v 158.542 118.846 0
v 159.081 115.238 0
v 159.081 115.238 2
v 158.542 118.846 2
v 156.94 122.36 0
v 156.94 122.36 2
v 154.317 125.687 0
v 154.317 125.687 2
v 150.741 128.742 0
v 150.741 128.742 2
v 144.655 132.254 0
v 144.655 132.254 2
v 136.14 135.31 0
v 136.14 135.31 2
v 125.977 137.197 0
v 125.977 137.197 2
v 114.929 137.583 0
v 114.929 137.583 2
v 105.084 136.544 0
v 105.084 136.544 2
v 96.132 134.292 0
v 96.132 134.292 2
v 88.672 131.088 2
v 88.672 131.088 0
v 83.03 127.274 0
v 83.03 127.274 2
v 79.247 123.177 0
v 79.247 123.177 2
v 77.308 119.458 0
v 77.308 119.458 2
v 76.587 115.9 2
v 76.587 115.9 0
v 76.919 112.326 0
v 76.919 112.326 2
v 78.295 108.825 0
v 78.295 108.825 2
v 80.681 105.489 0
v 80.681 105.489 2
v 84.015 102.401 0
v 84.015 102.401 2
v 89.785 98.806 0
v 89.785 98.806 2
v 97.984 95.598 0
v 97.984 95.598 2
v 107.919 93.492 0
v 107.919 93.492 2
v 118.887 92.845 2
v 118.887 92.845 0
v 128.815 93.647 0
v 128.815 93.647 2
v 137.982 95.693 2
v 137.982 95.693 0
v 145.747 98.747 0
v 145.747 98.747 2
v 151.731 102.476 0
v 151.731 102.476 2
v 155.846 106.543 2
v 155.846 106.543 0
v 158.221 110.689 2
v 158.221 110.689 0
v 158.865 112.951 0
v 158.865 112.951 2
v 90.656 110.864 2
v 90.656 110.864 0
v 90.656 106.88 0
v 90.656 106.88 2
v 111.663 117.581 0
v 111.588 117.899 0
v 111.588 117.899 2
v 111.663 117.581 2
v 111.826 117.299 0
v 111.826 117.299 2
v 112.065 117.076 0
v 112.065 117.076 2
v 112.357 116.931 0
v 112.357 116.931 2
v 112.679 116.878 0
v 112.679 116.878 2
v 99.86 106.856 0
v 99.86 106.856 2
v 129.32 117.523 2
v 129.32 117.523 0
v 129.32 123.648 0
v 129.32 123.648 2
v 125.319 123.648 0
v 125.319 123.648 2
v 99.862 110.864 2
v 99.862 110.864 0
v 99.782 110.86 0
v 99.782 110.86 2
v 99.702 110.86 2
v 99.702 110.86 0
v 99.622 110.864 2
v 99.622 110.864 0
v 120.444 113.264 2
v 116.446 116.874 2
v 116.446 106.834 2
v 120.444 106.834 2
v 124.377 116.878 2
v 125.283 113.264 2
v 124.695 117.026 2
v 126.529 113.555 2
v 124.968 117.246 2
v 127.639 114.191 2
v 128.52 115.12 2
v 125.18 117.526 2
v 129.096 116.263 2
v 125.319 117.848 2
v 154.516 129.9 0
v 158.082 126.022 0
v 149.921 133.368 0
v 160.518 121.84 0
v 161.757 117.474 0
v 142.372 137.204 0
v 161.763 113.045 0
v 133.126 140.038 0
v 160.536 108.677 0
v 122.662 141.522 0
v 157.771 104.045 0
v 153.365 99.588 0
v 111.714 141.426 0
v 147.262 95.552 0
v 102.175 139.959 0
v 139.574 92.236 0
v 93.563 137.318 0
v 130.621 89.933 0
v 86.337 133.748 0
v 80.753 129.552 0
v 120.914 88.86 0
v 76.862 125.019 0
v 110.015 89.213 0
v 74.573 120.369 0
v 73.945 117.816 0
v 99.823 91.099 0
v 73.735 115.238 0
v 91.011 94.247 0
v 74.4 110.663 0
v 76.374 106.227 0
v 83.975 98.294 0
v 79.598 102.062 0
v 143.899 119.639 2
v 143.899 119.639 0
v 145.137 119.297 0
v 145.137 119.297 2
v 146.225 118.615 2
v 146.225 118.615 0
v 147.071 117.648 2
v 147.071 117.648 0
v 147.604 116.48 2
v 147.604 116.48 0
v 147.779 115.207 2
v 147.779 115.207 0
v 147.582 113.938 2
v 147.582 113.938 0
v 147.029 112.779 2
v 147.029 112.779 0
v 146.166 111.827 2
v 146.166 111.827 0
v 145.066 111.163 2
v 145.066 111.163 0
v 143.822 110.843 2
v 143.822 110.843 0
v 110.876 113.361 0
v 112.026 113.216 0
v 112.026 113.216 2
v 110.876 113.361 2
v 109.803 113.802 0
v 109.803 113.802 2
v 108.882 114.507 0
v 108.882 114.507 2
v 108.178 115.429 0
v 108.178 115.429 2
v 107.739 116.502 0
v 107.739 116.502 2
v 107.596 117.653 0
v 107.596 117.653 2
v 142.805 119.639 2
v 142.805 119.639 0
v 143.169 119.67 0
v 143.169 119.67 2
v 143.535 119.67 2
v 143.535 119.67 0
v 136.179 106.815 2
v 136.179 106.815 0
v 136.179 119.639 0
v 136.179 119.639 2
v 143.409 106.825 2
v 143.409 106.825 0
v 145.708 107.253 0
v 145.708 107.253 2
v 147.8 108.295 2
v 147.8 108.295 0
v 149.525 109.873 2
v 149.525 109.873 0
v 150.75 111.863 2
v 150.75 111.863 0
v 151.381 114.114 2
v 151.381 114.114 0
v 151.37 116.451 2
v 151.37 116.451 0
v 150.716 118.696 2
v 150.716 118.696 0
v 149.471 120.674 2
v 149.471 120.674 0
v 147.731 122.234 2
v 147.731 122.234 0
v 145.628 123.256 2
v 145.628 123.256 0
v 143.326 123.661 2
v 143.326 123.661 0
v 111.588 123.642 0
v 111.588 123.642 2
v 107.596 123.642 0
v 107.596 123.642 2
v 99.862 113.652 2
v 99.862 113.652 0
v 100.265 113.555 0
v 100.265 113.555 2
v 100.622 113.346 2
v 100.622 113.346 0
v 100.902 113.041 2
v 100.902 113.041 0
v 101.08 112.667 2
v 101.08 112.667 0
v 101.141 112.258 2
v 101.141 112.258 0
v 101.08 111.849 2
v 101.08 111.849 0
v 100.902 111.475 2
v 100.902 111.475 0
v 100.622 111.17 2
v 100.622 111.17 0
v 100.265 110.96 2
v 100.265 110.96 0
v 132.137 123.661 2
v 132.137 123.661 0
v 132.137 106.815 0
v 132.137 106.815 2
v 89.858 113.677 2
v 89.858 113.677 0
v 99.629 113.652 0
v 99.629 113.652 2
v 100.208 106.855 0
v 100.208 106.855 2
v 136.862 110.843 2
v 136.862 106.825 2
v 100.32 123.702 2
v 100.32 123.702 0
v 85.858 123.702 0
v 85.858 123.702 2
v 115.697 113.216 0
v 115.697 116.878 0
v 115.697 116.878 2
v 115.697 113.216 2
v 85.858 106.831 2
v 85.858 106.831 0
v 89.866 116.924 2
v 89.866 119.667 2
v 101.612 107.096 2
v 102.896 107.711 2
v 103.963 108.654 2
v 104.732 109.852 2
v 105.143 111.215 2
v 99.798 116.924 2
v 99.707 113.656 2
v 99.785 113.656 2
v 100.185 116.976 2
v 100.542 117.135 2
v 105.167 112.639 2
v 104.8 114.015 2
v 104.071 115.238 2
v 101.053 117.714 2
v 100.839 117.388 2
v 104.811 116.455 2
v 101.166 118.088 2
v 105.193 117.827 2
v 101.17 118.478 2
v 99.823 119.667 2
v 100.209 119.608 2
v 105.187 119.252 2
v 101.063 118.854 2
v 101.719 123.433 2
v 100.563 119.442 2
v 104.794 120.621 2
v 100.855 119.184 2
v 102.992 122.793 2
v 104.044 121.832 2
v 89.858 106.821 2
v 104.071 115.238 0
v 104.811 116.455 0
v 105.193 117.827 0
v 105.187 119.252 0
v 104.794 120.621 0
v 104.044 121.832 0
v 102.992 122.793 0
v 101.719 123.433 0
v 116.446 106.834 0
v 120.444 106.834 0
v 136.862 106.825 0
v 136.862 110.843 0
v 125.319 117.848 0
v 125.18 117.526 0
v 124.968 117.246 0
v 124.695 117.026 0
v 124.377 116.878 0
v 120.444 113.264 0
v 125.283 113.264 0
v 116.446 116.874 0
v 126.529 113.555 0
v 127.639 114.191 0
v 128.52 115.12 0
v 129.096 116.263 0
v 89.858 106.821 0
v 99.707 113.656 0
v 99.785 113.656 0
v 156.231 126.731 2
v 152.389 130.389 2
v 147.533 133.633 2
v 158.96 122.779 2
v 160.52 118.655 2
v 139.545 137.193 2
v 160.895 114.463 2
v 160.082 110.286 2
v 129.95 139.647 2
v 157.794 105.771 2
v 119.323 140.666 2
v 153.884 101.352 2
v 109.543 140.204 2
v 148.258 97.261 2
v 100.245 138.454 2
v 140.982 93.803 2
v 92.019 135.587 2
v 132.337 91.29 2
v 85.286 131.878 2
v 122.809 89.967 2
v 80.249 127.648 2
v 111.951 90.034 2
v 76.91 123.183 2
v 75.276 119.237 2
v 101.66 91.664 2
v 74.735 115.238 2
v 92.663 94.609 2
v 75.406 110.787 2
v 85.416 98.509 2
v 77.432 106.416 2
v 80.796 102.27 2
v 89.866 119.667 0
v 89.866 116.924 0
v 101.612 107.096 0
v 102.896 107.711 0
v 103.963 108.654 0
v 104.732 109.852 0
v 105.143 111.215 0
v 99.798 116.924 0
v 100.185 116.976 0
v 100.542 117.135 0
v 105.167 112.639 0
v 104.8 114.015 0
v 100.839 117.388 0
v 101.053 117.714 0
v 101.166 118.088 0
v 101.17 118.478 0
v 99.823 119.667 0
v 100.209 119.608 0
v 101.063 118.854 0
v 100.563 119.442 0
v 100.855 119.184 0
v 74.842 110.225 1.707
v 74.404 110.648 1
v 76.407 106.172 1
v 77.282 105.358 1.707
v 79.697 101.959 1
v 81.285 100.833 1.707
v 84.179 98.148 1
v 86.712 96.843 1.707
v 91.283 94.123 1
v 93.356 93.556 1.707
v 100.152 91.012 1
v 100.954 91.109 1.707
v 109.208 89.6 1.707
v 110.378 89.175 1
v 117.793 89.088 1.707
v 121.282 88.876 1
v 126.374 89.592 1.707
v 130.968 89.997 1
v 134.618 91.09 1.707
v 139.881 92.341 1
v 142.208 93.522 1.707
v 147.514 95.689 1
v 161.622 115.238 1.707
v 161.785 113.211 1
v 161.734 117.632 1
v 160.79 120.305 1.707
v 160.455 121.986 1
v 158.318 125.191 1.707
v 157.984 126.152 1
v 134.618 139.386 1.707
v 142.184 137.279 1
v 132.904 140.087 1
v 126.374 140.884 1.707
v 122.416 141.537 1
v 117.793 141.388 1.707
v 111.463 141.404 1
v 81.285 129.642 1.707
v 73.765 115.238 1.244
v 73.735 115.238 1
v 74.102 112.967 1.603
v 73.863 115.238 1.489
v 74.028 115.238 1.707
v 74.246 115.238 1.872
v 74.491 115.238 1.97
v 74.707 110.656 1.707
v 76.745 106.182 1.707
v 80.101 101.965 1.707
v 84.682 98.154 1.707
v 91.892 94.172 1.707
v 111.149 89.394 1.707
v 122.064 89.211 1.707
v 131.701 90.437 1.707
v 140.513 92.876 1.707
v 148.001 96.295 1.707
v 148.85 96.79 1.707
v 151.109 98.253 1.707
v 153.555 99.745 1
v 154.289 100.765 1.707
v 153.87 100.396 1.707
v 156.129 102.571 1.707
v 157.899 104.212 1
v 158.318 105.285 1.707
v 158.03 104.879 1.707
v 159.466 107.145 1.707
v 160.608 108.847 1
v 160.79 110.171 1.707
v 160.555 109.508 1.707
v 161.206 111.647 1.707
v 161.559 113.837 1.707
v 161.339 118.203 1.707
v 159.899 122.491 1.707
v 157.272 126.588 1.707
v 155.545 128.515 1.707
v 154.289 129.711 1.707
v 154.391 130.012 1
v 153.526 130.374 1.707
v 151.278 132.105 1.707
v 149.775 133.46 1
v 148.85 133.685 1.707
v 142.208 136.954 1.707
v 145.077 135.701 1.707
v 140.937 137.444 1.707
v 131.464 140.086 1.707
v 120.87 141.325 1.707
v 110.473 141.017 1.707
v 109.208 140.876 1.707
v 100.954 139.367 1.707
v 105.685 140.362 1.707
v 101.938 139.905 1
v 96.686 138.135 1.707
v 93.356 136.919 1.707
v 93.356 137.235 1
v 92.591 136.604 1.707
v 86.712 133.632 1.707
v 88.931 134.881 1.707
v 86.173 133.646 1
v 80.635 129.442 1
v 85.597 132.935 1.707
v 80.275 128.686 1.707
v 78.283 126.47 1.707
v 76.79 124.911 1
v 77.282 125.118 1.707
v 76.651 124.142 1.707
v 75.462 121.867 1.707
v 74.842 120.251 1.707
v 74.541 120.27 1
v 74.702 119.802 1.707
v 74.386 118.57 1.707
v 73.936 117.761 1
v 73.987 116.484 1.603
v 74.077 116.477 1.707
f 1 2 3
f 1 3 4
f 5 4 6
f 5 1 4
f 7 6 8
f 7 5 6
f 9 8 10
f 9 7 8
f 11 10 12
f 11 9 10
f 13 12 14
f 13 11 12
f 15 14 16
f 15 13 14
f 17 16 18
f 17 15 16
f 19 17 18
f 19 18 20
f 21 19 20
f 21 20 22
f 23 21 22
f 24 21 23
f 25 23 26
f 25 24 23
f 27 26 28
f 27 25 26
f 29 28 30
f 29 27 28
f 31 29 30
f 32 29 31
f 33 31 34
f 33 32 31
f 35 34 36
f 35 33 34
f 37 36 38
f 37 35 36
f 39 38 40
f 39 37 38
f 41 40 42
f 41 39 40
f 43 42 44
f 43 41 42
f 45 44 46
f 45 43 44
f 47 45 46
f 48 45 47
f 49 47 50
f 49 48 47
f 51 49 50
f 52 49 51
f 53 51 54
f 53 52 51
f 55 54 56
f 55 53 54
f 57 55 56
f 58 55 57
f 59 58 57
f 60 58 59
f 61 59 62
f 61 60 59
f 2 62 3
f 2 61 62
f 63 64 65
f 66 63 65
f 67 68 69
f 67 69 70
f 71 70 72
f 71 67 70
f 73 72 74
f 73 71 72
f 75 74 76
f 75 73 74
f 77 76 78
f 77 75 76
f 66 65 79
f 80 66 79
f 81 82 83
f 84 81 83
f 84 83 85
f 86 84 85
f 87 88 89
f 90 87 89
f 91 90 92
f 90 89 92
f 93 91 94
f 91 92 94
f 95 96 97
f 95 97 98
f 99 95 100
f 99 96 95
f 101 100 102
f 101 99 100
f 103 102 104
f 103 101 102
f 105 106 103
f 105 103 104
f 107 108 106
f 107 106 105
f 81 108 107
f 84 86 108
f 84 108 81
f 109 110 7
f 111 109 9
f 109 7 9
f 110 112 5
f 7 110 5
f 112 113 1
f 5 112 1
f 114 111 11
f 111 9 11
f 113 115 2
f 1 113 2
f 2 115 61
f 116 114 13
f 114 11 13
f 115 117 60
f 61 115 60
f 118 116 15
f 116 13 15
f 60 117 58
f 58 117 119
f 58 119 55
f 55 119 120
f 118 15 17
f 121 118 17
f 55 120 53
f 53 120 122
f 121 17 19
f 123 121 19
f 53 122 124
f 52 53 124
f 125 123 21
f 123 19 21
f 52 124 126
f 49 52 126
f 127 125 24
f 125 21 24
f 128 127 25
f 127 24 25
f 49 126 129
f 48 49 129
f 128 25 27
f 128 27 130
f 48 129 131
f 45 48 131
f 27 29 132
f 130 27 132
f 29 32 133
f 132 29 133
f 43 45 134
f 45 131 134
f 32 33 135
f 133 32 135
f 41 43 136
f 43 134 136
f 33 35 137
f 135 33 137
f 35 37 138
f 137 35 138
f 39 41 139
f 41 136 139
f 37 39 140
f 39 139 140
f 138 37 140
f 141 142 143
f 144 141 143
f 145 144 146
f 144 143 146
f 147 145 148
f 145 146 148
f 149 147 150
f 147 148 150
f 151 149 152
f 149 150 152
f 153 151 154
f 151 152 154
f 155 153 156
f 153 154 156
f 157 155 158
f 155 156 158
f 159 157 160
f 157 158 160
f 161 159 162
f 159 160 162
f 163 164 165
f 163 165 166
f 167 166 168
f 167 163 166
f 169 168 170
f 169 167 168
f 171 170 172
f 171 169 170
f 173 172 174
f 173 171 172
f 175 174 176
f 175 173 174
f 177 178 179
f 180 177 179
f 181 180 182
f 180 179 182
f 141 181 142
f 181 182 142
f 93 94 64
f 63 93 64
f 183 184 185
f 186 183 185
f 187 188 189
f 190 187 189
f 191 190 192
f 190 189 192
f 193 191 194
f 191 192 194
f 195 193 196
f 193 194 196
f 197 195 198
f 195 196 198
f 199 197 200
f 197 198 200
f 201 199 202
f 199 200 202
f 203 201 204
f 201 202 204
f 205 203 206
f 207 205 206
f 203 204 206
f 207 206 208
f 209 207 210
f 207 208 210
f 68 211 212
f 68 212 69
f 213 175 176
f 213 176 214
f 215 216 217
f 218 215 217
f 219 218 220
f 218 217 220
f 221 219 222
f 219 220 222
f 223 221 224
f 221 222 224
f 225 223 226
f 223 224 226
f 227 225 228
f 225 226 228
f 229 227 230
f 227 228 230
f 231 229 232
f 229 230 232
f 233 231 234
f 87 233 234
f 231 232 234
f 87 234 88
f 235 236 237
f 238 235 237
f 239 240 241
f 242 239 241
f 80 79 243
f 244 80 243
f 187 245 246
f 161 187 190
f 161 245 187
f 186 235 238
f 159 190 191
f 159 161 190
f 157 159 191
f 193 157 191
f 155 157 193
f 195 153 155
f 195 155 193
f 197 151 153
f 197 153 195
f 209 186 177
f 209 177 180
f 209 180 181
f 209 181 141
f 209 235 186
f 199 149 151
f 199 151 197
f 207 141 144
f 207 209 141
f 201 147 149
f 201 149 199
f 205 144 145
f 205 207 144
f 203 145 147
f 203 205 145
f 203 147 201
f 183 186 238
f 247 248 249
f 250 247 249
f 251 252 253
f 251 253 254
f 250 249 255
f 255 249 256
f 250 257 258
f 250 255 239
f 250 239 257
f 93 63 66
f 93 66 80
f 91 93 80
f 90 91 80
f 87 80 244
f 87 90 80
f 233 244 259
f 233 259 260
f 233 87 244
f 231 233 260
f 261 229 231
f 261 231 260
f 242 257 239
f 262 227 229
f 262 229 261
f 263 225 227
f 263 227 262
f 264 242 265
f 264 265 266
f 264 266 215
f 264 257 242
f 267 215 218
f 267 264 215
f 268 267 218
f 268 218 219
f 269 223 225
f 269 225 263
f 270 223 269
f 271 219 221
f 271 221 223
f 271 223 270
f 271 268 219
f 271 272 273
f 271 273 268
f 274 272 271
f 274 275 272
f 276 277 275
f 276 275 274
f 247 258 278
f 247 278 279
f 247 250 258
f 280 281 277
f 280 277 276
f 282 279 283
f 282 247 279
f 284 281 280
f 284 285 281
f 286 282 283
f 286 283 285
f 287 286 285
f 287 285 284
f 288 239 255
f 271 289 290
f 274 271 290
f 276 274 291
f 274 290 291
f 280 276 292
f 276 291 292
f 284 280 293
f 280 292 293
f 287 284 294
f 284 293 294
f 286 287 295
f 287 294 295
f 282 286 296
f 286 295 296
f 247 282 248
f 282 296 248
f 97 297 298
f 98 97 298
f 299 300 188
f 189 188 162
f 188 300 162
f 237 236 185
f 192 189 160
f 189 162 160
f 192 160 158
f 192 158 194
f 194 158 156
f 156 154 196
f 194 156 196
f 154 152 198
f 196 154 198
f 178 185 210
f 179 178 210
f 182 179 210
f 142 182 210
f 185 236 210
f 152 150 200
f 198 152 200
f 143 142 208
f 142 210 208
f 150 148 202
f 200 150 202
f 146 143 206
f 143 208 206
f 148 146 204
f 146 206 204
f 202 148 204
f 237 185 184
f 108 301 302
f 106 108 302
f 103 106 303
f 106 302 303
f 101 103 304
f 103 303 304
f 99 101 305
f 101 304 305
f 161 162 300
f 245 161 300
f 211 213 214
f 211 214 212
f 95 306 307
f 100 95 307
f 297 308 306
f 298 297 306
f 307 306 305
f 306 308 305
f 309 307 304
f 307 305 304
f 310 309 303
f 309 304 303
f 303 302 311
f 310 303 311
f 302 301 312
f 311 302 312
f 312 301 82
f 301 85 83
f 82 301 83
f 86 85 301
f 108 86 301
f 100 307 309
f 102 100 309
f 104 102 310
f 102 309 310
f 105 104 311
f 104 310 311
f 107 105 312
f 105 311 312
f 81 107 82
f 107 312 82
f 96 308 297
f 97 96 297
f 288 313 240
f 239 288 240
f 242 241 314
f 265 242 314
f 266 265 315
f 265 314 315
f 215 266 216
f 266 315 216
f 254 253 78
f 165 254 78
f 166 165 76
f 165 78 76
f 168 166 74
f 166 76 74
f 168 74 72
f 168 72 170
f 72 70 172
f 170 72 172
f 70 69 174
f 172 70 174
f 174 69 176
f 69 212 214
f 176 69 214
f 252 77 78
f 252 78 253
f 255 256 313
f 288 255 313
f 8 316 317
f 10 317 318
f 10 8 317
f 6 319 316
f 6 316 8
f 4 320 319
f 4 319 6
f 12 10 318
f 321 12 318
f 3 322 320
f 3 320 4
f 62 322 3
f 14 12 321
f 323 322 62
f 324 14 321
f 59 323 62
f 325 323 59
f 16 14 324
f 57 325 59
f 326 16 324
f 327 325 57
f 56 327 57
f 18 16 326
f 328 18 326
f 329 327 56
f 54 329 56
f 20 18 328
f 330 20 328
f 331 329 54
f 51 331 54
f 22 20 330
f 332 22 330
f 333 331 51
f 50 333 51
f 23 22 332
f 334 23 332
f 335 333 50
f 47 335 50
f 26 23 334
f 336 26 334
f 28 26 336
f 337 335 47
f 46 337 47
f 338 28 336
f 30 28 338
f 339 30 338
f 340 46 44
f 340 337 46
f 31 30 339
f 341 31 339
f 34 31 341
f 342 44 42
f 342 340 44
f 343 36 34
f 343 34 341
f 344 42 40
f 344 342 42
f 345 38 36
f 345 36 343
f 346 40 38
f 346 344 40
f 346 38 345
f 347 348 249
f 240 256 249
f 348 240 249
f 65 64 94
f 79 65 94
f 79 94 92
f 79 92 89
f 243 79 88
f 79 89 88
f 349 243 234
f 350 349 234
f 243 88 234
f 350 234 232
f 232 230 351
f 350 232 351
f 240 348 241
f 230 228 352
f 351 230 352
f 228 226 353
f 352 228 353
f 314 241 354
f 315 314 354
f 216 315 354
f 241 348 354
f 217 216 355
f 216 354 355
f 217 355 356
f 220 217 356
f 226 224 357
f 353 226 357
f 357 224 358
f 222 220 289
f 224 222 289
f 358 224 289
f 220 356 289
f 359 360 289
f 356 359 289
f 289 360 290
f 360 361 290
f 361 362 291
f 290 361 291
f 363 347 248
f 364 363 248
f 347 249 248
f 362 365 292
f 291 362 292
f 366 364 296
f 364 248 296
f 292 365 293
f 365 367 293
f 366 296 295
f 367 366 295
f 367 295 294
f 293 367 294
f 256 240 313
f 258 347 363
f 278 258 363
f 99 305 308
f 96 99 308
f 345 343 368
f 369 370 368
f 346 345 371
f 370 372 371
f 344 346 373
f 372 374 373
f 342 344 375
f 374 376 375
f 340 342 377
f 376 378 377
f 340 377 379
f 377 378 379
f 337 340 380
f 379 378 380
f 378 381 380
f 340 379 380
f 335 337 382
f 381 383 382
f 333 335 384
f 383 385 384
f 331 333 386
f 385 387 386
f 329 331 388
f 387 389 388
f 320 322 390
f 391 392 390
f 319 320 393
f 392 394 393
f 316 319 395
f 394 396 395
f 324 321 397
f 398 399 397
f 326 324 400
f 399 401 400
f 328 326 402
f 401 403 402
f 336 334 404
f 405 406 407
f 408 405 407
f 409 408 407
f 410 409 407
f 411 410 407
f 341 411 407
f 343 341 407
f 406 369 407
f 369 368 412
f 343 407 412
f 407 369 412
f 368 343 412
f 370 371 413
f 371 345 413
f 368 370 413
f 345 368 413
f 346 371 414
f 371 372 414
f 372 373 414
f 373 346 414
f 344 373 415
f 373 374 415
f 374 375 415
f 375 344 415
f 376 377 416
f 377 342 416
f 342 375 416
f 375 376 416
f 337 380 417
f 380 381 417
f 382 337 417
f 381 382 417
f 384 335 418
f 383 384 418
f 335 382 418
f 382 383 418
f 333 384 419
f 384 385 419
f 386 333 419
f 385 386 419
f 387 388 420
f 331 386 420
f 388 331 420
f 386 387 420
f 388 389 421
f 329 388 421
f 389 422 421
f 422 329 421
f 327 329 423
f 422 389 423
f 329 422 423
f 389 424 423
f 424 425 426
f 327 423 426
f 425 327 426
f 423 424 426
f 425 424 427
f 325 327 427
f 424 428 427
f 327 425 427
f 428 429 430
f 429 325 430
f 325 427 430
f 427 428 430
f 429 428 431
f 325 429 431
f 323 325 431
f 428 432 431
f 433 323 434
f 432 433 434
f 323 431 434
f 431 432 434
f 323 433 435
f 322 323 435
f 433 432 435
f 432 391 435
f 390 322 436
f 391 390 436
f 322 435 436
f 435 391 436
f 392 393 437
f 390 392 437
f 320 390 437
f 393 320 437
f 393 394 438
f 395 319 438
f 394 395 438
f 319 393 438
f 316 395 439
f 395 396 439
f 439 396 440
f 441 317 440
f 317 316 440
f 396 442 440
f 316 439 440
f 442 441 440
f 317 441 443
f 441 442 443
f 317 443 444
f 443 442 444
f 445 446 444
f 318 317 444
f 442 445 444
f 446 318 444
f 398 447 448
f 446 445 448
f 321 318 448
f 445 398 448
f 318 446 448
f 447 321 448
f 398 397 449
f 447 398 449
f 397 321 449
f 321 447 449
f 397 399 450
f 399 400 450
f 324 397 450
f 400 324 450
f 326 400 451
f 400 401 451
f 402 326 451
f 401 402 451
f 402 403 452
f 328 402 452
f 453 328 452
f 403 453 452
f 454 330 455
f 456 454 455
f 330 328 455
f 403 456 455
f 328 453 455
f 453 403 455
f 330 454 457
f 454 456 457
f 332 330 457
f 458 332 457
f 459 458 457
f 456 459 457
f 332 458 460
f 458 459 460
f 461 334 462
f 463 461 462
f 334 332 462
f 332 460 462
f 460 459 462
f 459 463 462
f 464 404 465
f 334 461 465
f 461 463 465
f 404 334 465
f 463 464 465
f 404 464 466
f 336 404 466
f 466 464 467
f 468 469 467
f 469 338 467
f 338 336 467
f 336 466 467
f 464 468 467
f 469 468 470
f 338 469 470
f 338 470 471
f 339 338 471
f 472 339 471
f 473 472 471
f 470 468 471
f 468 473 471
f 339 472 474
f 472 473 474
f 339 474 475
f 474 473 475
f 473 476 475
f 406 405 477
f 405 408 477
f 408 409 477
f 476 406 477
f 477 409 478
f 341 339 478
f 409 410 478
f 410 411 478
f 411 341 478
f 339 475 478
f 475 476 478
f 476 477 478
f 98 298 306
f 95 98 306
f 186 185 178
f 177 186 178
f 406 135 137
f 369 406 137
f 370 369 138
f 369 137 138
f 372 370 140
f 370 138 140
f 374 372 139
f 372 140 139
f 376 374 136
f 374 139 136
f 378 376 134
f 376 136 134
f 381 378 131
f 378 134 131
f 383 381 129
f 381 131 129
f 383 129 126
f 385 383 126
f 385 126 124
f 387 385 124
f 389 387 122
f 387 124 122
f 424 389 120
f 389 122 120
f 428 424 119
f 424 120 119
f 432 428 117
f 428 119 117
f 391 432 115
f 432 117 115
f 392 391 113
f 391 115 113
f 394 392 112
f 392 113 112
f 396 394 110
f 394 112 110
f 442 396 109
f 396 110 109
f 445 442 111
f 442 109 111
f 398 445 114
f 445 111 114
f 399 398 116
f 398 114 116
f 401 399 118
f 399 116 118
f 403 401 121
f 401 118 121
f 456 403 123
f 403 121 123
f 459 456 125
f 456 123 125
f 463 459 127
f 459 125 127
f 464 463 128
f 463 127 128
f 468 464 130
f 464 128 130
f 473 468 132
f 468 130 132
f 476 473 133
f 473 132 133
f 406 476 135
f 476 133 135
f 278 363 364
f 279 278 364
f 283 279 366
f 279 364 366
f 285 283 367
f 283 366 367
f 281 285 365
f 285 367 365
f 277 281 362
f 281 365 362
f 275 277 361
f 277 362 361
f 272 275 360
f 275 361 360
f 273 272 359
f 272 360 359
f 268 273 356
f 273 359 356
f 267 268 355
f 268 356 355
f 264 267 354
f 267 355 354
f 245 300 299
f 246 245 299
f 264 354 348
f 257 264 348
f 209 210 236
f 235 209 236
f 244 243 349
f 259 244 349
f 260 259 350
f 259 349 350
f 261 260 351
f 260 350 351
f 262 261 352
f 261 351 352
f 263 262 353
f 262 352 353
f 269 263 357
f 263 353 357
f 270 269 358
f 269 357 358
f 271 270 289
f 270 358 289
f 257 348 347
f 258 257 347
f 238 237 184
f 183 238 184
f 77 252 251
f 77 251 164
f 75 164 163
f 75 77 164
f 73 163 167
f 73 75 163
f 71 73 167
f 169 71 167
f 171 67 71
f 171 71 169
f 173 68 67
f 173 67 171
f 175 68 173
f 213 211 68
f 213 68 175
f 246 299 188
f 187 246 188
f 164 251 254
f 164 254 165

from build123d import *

# Parameters (mm, degrees)
SKETCH_3_RX       = 44.090053558
SKETCH_3_RY       = 26.443239621
SKETCH_3_RX_2     = 41.255952368
SKETCH_3_RY_2     = 22.400810242
EXTRUDE_1_DEPTH   = 2
EXTRUDE_1_2_DEPTH = 2
EXTRUDE_1_3_DEPTH = 2
EXTRUDE_1_4_DEPTH = 2
EXTRUDE_1_5_DEPTH = 2
FILLET_1_R        = 1


with BuildPart() as part:
    # 草图3 → 凸台-拉伸1 (new body)
    with BuildSketch(Plane.XY):
        with Locations(Location((117.824832916, 115.23790741), (0, 0, 180))):
            Ellipse(SKETCH_3_RX, SKETCH_3_RY)
        with Locations((117.824832916, 115.23790741)):
            Ellipse(SKETCH_3_RX_2, SKETCH_3_RY_2, mode=Mode.SUBTRACT)
    extrude(amount=EXTRUDE_1_DEPTH)

    # 圆角1
    fillet_1_edges = [part.edges().sort_by_distance(p)[0] for p in [
        (161.914770663, 115.298516103, 2),
    ]]
    fillet(fillet_1_edges, radius=FILLET_1_R)


with BuildPart() as body_2:
    # 草图3 → Extrude 1 2 (new body)
    with BuildSketch(Plane.XY):
        with BuildLine():
            Line((100.320487976, 123.701698303), (85.857902527, 123.701698303))
            Line((85.857902527, 123.701698303), (85.857902527, 106.831474304))
            Line((85.857902527, 106.831474304), (89.85785675, 106.821266174))
            Line((89.85785675, 106.821266174), (89.85785675, 113.6771698))
            Line((89.85785675, 113.6771698), (99.629045068, 113.652244725))
            ThreePointArc((99.629045068, 113.652244725), (99.745733087, 113.656821169), (99.86239624, 113.651649475))
            ThreePointArc((99.86239624, 113.651649475), (101.141097708, 112.257892609), (99.86239624, 110.864135742))
            ThreePointArc((99.86239624, 110.864135742), (99.742164596, 110.858959497), (99.621932952, 110.864135742))
            Line((99.621932952, 110.864135742), (90.656356812, 110.864135742))
            Line((90.656356812, 110.864135742), (90.656356812, 106.879867554))
            Line((90.656356812, 106.879867554), (99.860228116, 106.856387052))
            Line((99.860228116, 106.856387052), (100.208221436, 106.855499268))
            ThreePointArc((100.208221436, 106.855499268), (104.731739573, 109.852213429), (104.070821683, 115.23790741))
            ThreePointArc((104.070821683, 115.23790741), (104.793856796, 120.621074732), (100.320487976, 123.701698303))
        make_face()
        with BuildLine():
            Line((89.865707397, 116.923698425), (89.865707397, 119.666885376))
            Line((89.865707397, 119.666885376), (99.797425153, 119.666885376))
            Line((99.797425153, 119.666885376), (99.823417664, 119.666885376))
            ThreePointArc((99.823417664, 119.666885376), (101.182014946, 118.28271099), (99.798248291, 116.923698425))
            Line((99.798248291, 116.923698425), (89.865707397, 116.923698425))
        make_face(mode=Mode.SUBTRACT)
    extrude(amount=EXTRUDE_1_2_DEPTH)


with BuildPart() as body_3:
    # 草图3 → Extrude 1 3 (new body)
    with BuildSketch(Plane.XY):
        with BuildLine():
            ThreePointArc((111.588310242, 117.898681641), (111.937267918, 117.178522683), (112.678985596, 116.878097534))
            Line((112.678985596, 116.878097534), (115.696937561, 116.878097534))
            Line((115.696937561, 116.878097534), (115.696937561, 113.216255188))
            Line((115.696937561, 113.216255188), (112.02633667, 113.216255188))
            ThreePointArc((112.02633667, 113.216255188), (108.882327189, 114.5074245), (107.595947266, 117.653396606))
            Line((107.595947266, 117.653396606), (107.595947266, 123.64239502))
            Line((107.595947266, 123.64239502), (111.588310242, 123.64239502))
            Line((111.588310242, 123.64239502), (111.588310242, 117.898681641))
        make_face()
    extrude(amount=EXTRUDE_1_3_DEPTH)


with BuildPart() as body_4:
    # 草图3 → Extrude 1 4 (new body)
    with BuildSketch(Plane.XY):
        with BuildLine():
            Line((124.547664698, 113.264060974), (125.282608032, 113.264060974))
            ThreePointArc((125.282608032, 113.264060974), (128.113315049, 114.623573913), (129.320327759, 117.522590637))
            Line((129.320327759, 117.522590637), (129.320327759, 123.64755249))
            Line((129.320327759, 123.64755249), (125.319236755, 123.64755249))
            Line((125.319236755, 123.64755249), (125.319236755, 117.847755432))
            ThreePointArc((125.319236755, 117.847755432), (124.968269871, 117.246162802), (124.376983643, 116.878097534))
            Line((124.376983643, 116.878097534), (116.446258545, 116.873641968))
            Line((116.446258545, 116.873641968), (116.446258545, 106.834098816))
            Line((116.446258545, 106.834098816), (120.443962097, 106.834098816))
            Line((120.443962097, 106.834098816), (120.443962097, 113.264060974))
            Line((120.443962097, 113.264060974), (124.547664698, 113.264060974))
        make_face()
    extrude(amount=EXTRUDE_1_4_DEPTH)


with BuildPart() as body_5:
    # 草图3 → Extrude 1 5 (new body)
    with BuildSketch(Plane.XY):
        with BuildLine():
            ThreePointArc((143.89906311, 119.63936615), (147.779438013, 115.207061658), (143.822433472, 110.843032837))
            Line((143.822433472, 110.843032837), (136.862030029, 110.843032837))
            Line((136.862030029, 110.843032837), (136.862030029, 106.825332642))
            Line((136.862030029, 106.825332642), (143.409423828, 106.825332642))
            ThreePointArc((143.409423828, 106.825332642), (151.457049674, 115.283053778), (143.326080322, 123.660682678))
            Line((143.326080322, 123.660682678), (132.137237549, 123.660682678))
            Line((132.137237549, 123.660682678), (132.137237549, 106.814918518))
            Line((132.137237549, 106.814918518), (136.179397583, 106.814918518))
            Line((136.179397583, 106.814918518), (136.179397583, 119.63936615))
            Line((136.179397583, 119.63936615), (142.804812511, 119.63936615))
            ThreePointArc((142.804812511, 119.63936615), (143.351937811, 119.673300221), (143.89906311, 119.63936615))
        make_face()
    extrude(amount=EXTRUDE_1_5_DEPTH)


solid = Compound([part.part, body_2.part, body_3.part, body_4.part, body_5.part])
